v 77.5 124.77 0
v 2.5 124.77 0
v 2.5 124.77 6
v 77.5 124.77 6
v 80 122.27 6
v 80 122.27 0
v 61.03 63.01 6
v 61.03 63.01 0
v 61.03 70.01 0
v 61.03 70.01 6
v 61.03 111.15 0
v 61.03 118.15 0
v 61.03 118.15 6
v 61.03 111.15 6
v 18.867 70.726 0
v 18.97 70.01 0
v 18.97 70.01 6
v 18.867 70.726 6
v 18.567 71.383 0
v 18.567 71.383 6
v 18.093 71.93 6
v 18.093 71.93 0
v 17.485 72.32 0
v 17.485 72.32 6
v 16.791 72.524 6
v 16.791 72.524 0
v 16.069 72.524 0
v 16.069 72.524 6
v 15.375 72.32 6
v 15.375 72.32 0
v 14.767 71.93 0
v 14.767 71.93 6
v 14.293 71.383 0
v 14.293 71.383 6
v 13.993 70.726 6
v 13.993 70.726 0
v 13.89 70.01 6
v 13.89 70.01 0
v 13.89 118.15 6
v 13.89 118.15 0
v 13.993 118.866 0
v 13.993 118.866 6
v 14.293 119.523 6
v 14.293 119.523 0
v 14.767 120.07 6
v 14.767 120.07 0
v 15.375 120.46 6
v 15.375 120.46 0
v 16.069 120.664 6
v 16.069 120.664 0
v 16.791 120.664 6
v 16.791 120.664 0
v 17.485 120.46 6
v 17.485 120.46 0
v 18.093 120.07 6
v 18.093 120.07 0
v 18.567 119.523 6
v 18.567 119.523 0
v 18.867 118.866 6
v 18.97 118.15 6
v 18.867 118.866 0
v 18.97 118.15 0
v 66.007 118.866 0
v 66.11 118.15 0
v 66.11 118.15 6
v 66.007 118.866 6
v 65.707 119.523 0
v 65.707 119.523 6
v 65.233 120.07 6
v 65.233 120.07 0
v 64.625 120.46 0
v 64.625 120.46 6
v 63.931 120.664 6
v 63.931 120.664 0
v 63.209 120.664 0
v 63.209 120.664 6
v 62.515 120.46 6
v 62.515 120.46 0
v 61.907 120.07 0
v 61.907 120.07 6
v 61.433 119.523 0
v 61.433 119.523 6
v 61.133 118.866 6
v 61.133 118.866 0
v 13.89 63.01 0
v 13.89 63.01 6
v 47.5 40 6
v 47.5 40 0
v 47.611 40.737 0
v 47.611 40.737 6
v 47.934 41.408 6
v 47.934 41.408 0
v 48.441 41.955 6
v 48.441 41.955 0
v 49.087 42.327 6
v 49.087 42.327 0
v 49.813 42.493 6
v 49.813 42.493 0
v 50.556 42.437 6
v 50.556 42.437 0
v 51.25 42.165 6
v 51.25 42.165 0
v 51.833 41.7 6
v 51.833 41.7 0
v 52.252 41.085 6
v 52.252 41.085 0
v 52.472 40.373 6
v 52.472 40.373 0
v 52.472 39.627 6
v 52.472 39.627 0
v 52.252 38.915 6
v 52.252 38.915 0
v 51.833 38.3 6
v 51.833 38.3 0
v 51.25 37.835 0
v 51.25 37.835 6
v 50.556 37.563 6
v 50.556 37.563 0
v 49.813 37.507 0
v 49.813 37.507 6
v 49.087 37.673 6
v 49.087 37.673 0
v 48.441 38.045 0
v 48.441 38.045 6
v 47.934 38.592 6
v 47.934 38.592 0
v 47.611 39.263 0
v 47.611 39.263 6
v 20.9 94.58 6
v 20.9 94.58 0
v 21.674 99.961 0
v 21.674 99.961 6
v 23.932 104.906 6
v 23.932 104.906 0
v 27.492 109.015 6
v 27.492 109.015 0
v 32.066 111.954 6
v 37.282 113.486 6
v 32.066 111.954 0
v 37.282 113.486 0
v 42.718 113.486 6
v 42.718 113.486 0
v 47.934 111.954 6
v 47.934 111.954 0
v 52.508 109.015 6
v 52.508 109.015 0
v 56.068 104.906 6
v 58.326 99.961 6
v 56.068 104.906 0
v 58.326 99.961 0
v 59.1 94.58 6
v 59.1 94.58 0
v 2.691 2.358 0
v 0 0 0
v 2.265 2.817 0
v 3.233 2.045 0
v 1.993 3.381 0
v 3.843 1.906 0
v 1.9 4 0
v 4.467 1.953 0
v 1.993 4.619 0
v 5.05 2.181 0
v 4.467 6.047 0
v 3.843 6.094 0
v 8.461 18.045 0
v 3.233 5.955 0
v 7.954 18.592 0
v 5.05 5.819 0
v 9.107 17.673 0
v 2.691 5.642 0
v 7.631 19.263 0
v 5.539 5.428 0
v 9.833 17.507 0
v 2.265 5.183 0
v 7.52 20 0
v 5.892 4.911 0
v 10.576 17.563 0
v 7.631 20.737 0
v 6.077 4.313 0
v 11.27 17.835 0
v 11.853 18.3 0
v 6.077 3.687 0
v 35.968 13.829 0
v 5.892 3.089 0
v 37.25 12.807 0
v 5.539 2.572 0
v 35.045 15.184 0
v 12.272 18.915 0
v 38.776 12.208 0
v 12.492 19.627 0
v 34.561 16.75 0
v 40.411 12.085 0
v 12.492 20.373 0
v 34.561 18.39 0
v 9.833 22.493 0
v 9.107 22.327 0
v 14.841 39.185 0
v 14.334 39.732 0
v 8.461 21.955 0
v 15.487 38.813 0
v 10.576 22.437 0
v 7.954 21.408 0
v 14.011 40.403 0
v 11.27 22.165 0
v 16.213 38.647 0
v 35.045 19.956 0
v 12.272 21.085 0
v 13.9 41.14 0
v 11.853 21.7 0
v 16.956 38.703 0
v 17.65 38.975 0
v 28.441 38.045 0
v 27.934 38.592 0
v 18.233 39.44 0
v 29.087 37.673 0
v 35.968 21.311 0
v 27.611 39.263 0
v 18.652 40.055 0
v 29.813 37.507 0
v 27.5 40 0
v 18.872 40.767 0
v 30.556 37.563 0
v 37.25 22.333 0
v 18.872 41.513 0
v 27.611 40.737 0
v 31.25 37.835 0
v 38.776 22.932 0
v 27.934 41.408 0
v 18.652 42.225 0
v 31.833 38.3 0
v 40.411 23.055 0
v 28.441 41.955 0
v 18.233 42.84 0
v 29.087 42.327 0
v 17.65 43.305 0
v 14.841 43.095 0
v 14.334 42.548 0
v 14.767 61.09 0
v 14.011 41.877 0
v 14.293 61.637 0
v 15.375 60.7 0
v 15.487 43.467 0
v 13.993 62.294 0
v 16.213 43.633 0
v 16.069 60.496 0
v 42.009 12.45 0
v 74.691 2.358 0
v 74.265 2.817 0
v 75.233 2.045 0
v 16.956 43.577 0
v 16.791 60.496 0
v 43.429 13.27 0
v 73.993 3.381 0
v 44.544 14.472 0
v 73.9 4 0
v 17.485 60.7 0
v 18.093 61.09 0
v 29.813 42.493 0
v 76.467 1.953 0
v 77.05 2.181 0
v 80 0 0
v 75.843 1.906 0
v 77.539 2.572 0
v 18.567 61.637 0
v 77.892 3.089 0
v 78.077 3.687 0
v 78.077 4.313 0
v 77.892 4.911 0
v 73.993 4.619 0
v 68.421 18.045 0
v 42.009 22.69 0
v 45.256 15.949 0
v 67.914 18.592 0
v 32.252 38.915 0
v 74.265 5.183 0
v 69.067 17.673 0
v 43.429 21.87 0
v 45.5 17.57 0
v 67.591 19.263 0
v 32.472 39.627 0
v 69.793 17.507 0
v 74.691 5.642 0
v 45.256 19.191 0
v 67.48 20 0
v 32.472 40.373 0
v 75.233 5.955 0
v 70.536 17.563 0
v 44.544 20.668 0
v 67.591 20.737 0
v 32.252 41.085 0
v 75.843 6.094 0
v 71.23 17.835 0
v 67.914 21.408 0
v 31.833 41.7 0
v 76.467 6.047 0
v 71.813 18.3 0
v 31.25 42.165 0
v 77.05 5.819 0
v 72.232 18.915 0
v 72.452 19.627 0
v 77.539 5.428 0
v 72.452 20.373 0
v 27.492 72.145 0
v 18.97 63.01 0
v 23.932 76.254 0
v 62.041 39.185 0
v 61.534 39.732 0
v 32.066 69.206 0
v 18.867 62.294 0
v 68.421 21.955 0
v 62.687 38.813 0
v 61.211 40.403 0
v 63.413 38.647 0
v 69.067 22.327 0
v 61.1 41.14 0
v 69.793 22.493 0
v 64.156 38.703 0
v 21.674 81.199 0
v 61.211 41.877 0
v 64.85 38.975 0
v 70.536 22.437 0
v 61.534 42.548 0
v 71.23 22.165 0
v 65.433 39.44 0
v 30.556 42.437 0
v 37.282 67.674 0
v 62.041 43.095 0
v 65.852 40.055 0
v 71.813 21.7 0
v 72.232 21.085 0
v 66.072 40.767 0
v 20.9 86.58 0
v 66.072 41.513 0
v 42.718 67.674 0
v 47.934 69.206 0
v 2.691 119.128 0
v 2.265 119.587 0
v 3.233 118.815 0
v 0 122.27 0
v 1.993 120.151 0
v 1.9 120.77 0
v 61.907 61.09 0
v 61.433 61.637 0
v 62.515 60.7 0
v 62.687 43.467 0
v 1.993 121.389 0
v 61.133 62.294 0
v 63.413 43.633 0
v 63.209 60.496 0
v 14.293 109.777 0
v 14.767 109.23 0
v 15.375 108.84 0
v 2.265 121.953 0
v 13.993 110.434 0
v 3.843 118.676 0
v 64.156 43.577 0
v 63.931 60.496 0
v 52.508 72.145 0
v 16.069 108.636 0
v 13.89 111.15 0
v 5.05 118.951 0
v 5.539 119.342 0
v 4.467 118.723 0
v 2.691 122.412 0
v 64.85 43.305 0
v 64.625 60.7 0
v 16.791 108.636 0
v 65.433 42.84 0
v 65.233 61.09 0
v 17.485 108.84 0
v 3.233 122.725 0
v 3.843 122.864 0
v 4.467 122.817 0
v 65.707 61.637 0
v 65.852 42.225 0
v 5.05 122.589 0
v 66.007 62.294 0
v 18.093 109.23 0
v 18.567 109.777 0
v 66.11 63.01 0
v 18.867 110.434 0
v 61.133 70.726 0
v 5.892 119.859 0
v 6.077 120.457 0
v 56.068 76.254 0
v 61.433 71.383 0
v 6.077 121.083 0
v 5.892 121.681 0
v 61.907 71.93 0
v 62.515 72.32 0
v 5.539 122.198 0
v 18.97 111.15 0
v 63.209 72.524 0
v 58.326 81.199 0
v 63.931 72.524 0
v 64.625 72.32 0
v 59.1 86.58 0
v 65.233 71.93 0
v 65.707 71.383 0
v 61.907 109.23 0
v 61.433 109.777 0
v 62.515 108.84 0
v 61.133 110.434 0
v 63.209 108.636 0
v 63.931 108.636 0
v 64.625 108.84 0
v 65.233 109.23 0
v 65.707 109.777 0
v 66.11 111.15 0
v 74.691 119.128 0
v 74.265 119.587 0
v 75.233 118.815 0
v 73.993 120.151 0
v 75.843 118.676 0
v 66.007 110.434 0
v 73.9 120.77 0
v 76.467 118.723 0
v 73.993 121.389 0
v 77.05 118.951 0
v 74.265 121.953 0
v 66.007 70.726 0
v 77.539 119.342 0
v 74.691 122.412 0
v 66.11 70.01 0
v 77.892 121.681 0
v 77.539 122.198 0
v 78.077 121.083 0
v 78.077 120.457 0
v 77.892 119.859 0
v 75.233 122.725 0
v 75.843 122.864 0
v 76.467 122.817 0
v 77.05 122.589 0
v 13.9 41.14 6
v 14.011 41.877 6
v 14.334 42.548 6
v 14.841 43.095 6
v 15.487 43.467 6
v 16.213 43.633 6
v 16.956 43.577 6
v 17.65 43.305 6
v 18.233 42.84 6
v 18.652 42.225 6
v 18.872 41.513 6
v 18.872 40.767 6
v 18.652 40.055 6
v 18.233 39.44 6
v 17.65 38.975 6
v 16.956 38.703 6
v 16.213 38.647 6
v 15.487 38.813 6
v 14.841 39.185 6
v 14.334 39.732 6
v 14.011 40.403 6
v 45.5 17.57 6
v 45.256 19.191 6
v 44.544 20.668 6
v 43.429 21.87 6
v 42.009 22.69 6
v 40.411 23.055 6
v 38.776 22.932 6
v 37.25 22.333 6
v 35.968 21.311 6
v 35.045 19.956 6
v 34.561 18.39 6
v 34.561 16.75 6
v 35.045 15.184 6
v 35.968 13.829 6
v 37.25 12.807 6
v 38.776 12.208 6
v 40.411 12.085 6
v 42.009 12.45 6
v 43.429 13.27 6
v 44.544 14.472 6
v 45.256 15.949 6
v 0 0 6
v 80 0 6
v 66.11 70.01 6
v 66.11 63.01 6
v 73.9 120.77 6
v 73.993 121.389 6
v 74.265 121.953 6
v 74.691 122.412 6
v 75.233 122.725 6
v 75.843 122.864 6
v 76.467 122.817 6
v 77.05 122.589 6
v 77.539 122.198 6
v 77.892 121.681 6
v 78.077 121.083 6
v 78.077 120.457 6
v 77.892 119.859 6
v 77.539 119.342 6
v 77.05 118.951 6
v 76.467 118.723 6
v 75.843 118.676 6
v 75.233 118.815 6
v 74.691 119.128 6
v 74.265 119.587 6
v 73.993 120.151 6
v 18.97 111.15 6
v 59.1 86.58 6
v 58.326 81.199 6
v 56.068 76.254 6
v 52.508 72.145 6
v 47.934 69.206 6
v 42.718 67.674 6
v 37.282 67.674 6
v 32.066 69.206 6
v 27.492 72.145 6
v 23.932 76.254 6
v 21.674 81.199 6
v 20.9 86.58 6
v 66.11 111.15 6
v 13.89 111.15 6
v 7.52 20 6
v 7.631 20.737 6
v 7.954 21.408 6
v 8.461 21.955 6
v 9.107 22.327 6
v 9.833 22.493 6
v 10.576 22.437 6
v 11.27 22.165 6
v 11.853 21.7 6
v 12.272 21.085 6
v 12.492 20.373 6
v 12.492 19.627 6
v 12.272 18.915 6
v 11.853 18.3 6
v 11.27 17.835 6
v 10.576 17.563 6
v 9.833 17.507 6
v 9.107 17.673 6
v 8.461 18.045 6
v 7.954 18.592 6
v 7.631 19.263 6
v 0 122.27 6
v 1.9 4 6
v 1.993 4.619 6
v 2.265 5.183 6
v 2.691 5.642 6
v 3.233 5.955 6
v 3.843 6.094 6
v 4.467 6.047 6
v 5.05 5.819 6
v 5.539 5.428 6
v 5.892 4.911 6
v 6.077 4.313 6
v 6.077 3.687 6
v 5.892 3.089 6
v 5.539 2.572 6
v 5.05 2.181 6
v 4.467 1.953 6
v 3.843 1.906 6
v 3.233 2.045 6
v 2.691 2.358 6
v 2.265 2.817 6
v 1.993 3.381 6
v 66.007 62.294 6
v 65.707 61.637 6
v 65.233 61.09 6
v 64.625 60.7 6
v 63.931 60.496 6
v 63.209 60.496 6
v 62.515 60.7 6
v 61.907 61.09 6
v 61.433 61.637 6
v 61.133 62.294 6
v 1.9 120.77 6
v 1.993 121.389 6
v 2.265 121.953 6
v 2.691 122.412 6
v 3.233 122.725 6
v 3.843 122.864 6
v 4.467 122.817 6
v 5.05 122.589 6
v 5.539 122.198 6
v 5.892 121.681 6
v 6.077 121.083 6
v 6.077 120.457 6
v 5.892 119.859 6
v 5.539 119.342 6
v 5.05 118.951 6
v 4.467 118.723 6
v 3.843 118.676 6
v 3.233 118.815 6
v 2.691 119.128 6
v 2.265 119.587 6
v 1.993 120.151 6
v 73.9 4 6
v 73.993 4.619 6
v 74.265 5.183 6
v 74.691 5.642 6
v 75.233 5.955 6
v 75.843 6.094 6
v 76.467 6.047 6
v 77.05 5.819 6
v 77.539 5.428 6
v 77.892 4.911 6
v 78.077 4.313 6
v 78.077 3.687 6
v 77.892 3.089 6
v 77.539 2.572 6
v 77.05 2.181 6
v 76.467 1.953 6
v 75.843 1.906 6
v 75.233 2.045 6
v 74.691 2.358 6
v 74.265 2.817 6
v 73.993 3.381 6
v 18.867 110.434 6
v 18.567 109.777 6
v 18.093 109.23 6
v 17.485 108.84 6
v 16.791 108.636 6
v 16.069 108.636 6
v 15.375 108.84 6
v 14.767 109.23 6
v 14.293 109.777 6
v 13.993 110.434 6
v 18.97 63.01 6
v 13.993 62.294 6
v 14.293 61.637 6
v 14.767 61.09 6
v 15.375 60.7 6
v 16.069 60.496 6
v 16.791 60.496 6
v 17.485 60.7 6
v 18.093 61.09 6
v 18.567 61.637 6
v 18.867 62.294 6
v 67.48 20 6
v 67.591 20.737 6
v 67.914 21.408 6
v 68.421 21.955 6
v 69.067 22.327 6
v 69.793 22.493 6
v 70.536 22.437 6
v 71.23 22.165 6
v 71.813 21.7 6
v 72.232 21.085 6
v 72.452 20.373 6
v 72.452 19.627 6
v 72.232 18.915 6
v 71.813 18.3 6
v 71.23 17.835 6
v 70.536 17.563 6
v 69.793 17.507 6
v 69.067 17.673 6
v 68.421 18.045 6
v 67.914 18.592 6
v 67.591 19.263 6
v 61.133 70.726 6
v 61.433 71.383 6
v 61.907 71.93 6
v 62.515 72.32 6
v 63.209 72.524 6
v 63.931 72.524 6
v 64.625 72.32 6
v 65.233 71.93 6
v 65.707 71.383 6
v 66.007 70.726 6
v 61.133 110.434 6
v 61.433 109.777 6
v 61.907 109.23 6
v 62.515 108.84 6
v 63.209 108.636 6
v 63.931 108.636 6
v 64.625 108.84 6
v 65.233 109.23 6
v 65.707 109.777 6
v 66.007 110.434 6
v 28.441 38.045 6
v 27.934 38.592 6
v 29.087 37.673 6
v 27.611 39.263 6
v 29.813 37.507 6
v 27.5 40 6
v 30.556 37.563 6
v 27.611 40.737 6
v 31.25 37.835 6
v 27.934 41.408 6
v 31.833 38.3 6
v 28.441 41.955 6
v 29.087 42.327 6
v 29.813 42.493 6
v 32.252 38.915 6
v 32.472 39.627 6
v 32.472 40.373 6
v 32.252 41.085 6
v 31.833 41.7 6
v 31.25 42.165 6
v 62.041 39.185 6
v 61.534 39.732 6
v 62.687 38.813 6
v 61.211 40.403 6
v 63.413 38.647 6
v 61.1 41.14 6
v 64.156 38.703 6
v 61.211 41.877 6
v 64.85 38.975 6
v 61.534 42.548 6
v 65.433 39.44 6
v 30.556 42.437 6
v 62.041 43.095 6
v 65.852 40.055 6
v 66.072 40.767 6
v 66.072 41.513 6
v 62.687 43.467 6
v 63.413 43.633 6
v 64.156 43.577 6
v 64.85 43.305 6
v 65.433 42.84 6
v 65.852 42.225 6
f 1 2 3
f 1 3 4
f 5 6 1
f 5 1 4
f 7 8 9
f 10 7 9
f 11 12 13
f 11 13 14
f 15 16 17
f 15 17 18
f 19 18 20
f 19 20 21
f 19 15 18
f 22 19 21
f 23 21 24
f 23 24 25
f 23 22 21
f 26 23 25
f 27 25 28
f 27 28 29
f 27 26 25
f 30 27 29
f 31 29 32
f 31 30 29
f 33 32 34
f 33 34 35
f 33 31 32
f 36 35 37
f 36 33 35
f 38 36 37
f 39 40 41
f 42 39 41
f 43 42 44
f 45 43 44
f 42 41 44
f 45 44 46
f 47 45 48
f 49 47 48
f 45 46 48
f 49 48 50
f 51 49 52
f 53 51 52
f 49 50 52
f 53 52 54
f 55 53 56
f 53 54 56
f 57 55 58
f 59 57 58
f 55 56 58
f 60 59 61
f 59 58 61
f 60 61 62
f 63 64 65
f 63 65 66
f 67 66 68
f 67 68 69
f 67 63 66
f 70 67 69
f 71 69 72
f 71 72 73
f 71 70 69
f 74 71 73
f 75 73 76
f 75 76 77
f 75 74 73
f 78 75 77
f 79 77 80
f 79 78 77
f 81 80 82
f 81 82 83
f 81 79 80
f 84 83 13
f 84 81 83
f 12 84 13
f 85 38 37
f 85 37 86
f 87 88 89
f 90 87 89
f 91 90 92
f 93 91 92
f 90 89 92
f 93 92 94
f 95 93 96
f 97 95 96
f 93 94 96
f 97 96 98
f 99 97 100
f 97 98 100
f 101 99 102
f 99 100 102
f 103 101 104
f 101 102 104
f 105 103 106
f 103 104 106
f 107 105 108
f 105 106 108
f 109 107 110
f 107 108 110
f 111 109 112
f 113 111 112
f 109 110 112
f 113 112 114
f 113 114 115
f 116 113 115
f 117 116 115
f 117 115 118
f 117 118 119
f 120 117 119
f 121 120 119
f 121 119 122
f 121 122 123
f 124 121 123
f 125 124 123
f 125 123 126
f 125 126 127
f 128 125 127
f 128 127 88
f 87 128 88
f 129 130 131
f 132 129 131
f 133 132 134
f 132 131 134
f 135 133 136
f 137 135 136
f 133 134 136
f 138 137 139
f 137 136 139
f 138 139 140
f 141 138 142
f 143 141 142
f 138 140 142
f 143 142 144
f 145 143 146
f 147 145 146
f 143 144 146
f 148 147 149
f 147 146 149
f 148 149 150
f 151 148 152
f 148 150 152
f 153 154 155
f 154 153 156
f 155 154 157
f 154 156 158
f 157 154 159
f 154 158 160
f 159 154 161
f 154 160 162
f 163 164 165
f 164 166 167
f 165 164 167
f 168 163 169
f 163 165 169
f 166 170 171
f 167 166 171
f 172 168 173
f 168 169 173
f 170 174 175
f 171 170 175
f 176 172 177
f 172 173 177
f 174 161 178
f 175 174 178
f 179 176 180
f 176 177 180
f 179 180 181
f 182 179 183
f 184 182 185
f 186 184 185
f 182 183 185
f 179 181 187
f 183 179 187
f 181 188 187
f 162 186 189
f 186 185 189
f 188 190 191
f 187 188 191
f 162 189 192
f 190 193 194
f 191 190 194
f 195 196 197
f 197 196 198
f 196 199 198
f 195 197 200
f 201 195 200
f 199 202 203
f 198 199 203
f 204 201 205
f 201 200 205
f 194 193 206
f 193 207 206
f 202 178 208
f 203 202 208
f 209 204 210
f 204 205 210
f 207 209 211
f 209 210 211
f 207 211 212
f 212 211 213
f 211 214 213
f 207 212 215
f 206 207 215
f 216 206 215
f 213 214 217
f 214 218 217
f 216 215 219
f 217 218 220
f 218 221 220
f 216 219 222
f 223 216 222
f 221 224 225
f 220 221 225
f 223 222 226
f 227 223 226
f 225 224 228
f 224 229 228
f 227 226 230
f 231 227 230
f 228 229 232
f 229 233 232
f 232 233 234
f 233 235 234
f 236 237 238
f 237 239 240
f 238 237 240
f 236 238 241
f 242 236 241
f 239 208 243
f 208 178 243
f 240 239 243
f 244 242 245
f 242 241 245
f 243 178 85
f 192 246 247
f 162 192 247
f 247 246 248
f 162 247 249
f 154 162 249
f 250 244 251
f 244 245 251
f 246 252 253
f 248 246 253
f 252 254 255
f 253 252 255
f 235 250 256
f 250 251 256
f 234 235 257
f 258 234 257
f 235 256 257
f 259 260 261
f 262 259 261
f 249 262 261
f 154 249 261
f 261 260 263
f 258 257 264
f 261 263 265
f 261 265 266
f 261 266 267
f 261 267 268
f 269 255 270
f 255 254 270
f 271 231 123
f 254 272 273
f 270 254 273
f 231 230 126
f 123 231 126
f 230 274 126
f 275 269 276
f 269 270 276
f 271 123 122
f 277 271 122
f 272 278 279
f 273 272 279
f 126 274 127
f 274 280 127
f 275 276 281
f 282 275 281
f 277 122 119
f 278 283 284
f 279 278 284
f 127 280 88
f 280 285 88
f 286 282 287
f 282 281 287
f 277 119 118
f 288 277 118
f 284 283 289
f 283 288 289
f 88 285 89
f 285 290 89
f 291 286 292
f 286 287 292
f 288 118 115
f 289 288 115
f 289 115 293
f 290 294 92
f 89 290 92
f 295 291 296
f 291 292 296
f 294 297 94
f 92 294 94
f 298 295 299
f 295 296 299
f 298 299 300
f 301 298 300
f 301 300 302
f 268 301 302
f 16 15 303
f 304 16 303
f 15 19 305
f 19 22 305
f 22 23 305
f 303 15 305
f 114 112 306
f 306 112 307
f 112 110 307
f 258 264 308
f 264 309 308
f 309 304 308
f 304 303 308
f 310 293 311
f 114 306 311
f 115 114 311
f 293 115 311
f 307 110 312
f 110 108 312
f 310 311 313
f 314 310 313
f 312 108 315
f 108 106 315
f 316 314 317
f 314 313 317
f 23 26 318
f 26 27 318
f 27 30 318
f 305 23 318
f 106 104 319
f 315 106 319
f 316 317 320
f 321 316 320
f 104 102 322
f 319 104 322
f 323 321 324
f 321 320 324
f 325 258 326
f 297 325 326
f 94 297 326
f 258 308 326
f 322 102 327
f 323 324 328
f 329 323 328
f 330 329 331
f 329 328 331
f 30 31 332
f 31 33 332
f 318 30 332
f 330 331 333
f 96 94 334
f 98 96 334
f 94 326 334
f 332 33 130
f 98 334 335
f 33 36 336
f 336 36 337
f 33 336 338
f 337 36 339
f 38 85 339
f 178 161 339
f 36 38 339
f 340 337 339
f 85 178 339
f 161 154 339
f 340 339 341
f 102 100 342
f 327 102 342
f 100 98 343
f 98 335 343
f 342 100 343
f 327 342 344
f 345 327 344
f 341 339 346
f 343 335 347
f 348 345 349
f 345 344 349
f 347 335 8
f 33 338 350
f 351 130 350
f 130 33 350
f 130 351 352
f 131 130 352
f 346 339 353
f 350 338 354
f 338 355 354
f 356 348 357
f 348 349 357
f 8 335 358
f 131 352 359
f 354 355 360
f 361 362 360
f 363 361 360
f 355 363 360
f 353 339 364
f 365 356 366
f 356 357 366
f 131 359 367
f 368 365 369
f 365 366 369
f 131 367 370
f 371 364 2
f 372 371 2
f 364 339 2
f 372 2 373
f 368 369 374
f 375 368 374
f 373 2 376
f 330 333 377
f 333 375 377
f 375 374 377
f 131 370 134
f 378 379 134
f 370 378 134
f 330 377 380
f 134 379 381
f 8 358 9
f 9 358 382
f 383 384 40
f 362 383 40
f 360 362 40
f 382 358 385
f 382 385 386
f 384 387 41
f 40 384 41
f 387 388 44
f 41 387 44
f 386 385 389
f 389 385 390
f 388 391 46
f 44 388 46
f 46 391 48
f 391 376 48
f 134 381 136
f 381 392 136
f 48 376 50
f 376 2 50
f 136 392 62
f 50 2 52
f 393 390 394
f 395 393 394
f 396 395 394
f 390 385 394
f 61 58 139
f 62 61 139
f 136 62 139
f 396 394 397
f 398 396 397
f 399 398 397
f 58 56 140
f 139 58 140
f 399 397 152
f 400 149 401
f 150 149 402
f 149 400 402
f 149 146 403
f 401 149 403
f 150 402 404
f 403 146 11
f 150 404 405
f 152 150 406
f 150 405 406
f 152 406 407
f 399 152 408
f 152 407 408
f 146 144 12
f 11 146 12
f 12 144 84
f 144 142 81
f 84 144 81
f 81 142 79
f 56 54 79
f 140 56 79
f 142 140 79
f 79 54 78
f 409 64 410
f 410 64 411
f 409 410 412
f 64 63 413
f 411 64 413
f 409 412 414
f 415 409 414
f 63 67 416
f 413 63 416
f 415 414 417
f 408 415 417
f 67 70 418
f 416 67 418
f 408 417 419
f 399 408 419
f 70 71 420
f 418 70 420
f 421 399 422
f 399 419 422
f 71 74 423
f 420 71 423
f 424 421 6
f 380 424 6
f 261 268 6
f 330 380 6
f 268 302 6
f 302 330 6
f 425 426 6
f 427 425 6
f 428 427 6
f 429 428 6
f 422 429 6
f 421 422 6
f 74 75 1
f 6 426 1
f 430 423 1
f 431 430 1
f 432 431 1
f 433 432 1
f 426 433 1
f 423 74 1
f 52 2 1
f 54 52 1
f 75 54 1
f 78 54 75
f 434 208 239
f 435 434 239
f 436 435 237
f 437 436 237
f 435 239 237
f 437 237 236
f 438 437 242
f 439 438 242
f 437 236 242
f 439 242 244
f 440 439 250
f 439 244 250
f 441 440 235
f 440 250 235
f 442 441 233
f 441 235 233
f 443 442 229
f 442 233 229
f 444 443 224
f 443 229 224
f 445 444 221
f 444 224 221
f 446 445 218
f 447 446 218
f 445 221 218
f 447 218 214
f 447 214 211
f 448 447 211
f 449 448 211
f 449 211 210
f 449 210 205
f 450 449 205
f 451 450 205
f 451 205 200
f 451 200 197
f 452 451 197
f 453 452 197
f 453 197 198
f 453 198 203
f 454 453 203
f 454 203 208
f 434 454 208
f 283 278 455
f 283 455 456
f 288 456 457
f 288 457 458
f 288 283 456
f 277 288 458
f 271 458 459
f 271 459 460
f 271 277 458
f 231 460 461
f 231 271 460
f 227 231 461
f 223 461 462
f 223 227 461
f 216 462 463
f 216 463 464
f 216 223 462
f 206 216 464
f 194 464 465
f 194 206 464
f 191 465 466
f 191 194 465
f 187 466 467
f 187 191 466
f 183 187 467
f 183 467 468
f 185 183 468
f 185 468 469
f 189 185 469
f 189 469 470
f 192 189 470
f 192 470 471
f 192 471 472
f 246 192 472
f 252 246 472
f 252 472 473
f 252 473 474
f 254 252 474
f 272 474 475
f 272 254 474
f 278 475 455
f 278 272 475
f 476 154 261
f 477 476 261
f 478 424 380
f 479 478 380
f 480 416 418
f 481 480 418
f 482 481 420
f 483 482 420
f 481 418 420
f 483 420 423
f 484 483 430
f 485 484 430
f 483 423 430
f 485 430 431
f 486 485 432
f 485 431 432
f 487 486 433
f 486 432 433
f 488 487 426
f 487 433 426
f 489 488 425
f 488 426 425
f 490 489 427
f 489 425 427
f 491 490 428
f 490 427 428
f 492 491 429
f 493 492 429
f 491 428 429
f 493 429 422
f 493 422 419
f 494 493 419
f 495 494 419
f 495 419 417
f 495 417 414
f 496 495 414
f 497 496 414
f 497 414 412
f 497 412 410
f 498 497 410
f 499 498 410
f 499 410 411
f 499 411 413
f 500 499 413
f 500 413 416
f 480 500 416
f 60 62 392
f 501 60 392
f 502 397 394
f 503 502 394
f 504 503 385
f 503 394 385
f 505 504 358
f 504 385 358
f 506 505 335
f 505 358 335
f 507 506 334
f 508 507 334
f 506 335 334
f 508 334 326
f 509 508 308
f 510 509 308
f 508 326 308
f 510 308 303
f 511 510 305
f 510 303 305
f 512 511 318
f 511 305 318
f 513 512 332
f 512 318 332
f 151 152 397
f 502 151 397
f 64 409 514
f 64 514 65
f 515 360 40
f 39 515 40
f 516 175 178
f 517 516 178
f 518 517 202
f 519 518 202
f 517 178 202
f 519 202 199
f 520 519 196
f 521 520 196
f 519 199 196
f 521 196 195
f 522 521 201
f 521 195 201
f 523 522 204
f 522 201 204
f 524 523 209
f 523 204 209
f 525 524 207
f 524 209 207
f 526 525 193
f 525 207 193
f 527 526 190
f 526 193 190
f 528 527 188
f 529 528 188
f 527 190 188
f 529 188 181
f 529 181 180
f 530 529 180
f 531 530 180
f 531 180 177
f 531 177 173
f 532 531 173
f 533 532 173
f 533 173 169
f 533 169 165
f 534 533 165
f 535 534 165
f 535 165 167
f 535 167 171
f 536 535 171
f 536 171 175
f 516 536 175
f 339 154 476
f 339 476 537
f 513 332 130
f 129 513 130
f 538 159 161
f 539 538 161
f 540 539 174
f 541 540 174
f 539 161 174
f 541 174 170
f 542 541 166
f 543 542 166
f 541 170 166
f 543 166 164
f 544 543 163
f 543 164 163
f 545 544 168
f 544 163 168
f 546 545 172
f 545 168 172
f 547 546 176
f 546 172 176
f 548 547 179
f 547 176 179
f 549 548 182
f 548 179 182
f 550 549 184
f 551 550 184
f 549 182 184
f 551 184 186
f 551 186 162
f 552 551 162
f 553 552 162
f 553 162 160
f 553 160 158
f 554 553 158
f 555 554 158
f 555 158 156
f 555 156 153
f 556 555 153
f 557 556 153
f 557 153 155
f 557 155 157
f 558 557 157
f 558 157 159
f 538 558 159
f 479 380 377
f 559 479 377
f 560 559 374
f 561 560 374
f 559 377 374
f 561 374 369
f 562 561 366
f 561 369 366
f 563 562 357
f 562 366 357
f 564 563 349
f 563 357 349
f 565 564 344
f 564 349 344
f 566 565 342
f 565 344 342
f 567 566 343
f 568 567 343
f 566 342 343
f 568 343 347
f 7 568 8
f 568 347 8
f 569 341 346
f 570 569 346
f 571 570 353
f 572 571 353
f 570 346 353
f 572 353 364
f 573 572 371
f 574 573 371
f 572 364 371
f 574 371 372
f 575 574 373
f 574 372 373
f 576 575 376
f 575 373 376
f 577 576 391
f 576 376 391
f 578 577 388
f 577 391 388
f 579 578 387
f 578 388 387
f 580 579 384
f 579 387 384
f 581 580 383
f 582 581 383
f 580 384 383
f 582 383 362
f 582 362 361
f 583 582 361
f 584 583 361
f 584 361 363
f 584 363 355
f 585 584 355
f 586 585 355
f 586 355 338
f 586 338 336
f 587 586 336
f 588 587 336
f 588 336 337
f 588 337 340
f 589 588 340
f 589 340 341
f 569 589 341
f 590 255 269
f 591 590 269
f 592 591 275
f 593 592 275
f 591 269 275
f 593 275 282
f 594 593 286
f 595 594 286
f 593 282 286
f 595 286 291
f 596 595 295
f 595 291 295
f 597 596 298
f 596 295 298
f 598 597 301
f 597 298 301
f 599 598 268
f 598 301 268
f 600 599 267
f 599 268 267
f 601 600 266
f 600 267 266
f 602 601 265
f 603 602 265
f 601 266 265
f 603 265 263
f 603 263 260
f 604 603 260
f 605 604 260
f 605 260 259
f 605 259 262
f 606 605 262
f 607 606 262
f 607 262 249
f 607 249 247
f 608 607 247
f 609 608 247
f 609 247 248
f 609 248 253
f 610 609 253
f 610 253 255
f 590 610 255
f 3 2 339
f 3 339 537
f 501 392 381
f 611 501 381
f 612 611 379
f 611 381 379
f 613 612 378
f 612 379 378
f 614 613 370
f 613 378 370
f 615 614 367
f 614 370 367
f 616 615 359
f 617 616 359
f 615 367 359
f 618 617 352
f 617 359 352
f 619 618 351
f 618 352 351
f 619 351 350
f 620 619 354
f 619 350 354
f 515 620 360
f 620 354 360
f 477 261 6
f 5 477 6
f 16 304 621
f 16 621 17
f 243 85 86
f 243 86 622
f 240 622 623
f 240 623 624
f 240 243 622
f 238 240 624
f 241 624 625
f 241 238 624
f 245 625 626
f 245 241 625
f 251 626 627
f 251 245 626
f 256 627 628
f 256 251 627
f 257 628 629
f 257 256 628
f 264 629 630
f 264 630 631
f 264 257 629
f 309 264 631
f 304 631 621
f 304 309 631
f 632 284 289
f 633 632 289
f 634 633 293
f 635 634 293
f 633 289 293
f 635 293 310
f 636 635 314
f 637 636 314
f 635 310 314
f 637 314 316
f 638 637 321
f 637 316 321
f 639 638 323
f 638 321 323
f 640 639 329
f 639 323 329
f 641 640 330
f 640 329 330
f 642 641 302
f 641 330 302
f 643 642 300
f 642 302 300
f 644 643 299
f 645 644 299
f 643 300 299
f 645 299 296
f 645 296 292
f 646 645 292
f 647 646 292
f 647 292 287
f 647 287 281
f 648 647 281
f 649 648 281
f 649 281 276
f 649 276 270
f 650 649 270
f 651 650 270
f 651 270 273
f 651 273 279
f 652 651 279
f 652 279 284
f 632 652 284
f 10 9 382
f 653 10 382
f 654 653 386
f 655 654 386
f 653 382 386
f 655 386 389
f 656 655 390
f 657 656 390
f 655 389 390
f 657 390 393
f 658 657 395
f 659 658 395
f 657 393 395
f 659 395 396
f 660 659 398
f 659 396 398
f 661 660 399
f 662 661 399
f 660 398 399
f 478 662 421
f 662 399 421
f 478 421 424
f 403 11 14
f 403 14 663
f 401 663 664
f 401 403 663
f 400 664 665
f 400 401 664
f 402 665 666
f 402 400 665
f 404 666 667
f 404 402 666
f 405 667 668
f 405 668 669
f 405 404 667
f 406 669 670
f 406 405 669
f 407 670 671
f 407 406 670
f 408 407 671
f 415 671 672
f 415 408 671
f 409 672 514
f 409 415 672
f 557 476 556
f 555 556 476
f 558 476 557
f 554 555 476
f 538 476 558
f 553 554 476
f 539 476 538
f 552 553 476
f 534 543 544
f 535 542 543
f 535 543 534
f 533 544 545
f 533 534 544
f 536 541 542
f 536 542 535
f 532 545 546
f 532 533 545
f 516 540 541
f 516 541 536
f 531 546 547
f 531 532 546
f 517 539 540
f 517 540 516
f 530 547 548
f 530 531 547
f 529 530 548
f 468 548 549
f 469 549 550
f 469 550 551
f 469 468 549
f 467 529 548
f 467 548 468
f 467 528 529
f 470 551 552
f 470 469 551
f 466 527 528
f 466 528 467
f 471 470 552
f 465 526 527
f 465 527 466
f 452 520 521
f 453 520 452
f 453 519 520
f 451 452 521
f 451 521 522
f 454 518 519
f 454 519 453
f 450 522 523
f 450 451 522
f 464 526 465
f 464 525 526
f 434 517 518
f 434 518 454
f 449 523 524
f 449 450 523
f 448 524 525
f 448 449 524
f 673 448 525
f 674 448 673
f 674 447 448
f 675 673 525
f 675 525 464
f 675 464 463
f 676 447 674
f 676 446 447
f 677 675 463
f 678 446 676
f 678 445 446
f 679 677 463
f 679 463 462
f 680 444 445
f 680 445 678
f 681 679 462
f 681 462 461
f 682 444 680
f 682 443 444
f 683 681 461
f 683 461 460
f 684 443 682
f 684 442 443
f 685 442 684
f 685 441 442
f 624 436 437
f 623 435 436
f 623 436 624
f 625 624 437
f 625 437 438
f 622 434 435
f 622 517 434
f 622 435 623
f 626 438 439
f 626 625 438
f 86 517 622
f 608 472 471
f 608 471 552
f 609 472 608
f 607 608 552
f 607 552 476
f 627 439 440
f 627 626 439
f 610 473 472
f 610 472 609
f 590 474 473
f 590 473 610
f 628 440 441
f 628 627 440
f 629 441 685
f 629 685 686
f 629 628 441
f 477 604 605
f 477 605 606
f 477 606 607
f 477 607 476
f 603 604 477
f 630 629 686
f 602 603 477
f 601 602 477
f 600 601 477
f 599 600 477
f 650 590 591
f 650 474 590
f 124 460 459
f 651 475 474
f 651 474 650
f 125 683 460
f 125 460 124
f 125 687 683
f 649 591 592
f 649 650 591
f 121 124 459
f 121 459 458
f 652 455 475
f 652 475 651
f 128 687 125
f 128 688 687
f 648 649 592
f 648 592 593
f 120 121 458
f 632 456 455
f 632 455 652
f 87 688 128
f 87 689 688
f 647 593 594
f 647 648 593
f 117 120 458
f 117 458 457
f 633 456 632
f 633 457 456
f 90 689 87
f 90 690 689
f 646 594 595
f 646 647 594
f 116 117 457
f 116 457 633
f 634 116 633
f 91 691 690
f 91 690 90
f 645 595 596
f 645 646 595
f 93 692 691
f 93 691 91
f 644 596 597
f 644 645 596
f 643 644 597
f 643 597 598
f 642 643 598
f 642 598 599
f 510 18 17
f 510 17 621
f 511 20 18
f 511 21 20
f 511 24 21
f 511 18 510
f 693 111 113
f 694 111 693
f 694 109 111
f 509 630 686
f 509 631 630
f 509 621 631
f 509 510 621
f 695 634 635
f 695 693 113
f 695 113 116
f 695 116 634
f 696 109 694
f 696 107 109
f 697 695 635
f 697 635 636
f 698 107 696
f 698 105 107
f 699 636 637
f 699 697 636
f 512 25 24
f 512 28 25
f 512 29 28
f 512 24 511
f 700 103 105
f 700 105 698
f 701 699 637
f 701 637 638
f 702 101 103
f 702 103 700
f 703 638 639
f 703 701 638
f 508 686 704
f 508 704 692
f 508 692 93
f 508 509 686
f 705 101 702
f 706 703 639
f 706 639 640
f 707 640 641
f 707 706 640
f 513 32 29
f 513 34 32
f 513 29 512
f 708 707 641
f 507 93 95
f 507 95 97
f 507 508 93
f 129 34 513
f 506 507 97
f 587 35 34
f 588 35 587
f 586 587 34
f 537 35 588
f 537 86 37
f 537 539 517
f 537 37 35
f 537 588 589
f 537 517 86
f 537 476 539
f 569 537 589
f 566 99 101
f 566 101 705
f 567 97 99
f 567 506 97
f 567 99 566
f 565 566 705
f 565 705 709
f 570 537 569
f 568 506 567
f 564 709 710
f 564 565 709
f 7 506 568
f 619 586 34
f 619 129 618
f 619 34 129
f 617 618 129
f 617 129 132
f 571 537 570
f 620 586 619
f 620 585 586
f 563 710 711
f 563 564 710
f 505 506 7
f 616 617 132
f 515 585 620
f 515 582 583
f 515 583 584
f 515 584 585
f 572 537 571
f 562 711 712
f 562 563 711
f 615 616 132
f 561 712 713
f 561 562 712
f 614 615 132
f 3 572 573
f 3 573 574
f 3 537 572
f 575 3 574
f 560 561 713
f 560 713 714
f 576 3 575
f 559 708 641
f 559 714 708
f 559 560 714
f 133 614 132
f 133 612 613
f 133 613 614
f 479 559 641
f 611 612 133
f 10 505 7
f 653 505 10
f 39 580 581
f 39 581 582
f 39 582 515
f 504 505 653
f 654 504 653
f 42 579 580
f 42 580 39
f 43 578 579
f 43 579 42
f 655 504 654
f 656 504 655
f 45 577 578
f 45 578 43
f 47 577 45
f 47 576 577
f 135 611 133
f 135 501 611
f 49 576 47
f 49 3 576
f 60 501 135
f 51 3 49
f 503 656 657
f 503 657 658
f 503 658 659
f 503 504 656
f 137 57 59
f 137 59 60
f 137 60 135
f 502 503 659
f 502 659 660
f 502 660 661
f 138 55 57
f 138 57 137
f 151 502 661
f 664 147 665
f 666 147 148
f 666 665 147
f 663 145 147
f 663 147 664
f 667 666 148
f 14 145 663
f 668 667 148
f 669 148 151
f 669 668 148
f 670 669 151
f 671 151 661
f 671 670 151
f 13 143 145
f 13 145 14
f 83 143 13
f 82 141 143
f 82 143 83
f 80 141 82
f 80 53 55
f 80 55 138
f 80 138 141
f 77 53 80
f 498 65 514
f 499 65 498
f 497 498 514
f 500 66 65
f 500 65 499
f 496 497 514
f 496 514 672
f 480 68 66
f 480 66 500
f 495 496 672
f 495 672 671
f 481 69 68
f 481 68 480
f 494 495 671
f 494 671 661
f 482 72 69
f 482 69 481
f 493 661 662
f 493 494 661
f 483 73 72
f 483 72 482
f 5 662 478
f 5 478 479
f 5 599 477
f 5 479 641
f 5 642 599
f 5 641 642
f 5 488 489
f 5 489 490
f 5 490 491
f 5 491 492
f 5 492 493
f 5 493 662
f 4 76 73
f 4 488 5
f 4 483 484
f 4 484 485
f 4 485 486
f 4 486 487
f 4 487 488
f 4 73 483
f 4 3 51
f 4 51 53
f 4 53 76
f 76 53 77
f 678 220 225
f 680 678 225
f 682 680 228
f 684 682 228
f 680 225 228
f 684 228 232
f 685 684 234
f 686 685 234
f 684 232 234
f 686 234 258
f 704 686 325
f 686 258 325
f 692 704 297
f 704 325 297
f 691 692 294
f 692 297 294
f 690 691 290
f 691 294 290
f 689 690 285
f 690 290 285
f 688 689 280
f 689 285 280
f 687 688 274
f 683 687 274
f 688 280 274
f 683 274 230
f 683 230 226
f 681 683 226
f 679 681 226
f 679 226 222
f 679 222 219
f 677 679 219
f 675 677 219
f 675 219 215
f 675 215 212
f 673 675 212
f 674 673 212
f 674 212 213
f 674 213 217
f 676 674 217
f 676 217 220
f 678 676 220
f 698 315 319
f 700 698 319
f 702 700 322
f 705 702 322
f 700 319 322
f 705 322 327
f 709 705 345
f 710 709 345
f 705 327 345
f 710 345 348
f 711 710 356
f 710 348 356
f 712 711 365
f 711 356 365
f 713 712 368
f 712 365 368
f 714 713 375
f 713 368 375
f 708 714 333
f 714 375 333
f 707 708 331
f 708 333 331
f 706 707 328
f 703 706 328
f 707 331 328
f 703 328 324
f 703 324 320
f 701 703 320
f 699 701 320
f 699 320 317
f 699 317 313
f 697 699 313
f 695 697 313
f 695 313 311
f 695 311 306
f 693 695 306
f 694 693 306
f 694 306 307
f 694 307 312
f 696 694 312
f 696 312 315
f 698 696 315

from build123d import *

# Parameters (mm, degrees)
SKETCH1_W                = 80
SKETCH1_H                = 124.77
SKETCH1_R                = 5.5
BOSS_EXTRUDE1_DEPTH      = 6
F_5_0_5_DIAMETER_HOLE1_D = 5
M5X0_8_TAPPED_HOLE1_D    = 4.2
CHAMFER1_SIZE            = 2.5


with BuildPart() as part:
    # Sketch1 → Boss-Extrude1 (new body)
    with BuildSketch(Plane.XY):
        with Locations((40, 62.385)):
            Rectangle(SKETCH1_W, SKETCH1_H)
        with Locations((40, 17.57)):
            Circle(SKETCH1_R, mode=Mode.SUBTRACT)
        with BuildLine():
            Line((59.1, 94.58), (59.1, 86.58))
            ThreePointArc((59.1, 86.58), (40, 67.48), (20.9, 86.58))
            Line((20.9, 86.58), (20.9, 94.58))
            ThreePointArc((20.9, 94.58), (40, 113.68), (59.1, 94.58))
        make_face(mode=Mode.SUBTRACT)
        with BuildLine():
            Line((18.97, 118.15), (18.97, 111.15))
            ThreePointArc((18.97, 111.15), (16.43, 108.61), (13.89, 111.15))
            Line((13.89, 111.15), (13.89, 118.15))
            ThreePointArc((13.89, 118.15), (16.43, 120.69), (18.97, 118.15))
        make_face(mode=Mode.SUBTRACT)
        with BuildLine():
            Line((61.03, 118.15), (61.03, 111.15))
            ThreePointArc((61.03, 111.15), (63.57, 108.61), (66.11, 111.15))
            Line((66.11, 111.15), (66.11, 118.15))
            ThreePointArc((66.11, 118.15), (63.57, 120.69), (61.03, 118.15))
        make_face(mode=Mode.SUBTRACT)
        with BuildLine():
            Line((18.97, 63.01), (18.97, 70.01))
            ThreePointArc((18.97, 70.01), (16.43, 72.55), (13.89, 70.01))
            Line((13.89, 70.01), (13.89, 63.01))
            ThreePointArc((13.89, 63.01), (16.43, 60.47), (18.97, 63.01))
        make_face(mode=Mode.SUBTRACT)
        with BuildLine():
            Line((61.03, 63.01), (61.03, 70.01))
            ThreePointArc((61.03, 70.01), (63.57, 72.55), (66.11, 70.01))
            Line((66.11, 70.01), (66.11, 63.01))
            ThreePointArc((66.11, 63.01), (63.57, 60.47), (61.03, 63.01))
        make_face(mode=Mode.SUBTRACT)
    extrude(amount=BOSS_EXTRUDE1_DEPTH)

    # Ø5.0 (5) Diameter Hole1 (through all)
    with Locations(Plane.XY.offset(6)):
        with Locations((10.02, 20), (16.4, 41.14), (30, 40), (50, 40), (63.6, 41.14), (69.98, 20)):
            Hole(F_5_0_5_DIAMETER_HOLE1_D / 2)

    # M5x0.8 Tapped Hole1 (through all)
    with Locations(Plane.XY.offset(6)):
        with Locations((4, 120.77), (76, 120.77), (76, 4), (4, 4)):
            Hole(M5X0_8_TAPPED_HOLE1_D / 2)

    # Chamfer1
    chamfer1_edges = [part.edges().sort_by_distance(p)[0] for p in [
        (0, 124.77, 3),
        (80, 124.77, 3),
    ]]
    chamfer(chamfer1_edges, length=CHAMFER1_SIZE)


solid = part.part
